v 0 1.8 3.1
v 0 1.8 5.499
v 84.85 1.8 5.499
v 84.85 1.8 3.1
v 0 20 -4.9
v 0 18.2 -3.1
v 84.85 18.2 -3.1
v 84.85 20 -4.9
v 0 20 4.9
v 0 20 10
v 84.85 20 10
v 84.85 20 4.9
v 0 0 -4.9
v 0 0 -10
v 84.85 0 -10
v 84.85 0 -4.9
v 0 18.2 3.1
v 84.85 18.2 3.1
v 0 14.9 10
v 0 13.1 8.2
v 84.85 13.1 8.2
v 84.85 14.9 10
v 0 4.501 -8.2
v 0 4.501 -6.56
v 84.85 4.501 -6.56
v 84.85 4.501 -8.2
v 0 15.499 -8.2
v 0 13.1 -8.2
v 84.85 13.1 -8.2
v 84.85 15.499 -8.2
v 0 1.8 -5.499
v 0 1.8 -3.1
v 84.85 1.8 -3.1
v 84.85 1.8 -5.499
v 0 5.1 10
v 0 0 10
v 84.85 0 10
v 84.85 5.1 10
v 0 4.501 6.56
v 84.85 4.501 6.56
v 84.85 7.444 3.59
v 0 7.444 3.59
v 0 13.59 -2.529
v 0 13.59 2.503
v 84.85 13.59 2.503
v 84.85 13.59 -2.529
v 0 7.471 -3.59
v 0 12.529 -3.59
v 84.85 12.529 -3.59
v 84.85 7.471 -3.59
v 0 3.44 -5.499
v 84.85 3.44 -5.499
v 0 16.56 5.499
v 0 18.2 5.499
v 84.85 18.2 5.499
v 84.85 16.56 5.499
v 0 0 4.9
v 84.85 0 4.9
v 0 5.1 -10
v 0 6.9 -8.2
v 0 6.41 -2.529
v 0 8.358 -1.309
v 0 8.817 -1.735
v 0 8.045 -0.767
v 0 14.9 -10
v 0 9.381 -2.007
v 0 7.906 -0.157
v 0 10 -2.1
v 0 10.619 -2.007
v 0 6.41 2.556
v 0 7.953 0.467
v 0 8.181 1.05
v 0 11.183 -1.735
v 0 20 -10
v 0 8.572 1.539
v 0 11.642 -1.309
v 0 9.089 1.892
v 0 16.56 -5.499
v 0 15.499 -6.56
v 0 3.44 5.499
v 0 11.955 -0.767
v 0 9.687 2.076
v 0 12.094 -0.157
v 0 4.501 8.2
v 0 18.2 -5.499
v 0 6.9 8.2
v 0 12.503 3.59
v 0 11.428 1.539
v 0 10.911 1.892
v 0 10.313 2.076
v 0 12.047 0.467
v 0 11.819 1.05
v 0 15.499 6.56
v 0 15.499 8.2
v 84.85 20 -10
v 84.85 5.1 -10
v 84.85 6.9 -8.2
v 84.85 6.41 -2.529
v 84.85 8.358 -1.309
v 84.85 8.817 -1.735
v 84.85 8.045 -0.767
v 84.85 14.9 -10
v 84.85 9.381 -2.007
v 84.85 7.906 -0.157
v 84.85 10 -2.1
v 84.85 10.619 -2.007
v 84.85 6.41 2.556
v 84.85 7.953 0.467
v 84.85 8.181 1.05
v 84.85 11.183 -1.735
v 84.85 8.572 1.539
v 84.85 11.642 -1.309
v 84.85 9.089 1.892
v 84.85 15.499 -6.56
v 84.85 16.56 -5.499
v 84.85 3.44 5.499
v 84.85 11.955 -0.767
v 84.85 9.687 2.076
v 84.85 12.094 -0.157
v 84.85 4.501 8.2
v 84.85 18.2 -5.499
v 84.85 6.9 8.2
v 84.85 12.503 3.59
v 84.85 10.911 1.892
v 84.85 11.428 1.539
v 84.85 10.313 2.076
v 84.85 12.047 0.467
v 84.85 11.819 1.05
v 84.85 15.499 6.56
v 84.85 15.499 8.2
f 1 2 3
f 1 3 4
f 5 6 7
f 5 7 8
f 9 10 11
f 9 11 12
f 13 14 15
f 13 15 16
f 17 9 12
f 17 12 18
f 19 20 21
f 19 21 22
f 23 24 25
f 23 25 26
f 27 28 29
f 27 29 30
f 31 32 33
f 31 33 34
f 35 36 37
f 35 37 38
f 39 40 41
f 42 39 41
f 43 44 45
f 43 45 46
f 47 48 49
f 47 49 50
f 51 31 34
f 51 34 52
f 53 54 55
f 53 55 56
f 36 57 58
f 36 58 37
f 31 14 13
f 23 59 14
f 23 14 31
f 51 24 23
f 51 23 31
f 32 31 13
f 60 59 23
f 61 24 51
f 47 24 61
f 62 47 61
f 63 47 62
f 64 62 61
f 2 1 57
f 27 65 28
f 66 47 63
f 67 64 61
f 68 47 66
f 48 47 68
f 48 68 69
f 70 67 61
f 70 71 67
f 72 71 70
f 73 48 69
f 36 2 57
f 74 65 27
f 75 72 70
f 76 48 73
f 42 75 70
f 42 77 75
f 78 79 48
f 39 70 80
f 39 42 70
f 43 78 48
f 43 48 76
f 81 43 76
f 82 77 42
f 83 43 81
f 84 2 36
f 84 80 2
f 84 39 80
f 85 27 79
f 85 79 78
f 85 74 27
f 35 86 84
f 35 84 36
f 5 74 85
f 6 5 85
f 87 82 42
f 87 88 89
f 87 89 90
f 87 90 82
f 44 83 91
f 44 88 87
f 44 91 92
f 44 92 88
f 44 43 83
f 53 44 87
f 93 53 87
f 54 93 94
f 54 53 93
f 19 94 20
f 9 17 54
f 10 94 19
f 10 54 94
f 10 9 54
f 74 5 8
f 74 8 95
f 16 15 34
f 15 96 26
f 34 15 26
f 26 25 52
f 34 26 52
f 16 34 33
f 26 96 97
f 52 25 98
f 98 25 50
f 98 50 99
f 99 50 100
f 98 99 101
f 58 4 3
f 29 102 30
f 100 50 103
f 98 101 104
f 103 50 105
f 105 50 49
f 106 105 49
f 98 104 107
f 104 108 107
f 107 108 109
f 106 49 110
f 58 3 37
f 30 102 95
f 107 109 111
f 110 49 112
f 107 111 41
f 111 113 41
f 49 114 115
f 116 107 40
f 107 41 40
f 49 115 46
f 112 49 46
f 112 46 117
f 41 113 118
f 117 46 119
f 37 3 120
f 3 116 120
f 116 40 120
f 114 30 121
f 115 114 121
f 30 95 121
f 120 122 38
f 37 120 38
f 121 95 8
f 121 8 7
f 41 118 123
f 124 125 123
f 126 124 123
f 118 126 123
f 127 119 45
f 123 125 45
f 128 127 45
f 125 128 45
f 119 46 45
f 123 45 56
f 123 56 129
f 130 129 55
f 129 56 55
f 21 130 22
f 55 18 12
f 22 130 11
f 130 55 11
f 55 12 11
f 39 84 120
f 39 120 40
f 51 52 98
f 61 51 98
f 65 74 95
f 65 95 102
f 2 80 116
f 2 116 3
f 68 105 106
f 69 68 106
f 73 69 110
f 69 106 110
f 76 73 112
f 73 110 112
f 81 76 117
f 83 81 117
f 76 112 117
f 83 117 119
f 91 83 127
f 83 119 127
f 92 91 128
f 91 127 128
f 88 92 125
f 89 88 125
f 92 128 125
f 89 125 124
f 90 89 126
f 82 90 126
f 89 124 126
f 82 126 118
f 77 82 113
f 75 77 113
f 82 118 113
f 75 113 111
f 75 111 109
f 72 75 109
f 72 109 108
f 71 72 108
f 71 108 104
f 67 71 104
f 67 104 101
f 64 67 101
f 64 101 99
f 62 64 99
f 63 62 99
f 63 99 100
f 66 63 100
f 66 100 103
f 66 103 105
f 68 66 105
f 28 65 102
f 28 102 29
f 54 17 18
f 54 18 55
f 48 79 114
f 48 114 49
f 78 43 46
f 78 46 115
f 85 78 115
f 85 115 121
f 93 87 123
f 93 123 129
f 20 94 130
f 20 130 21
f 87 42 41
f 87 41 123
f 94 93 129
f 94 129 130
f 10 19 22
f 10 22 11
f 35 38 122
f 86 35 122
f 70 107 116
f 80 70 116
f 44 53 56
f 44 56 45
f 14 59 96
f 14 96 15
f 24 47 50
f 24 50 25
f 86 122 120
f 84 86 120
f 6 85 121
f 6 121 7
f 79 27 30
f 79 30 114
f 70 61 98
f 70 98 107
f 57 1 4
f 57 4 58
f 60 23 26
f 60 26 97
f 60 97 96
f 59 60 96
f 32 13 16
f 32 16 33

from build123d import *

# Parameters (mm, degrees)
BOSS_EXTRUDE1_DEPTH = 84.85
SKETCH2_R           = 2.1
CUT_EXTRUDE1_DEPTH  = 88.746923023


with BuildPart() as part:
    # Sketch1 → Boss-Extrude1 (new body)
    with BuildSketch(Plane(origin=(0, 0, 0), x_dir=(0, 0, -1), z_dir=(1, 0, 0))):
        Polygon((-10, 20), (-4.900000095, 20), (-3.099999905, 18.200000763), (-5.499340057, 18.200000763), (-5.499340057, 16.559999466), (-2.502582312, 13.590000153), (2.52933979, 13.590000153), (5.499340057, 16.559999466), (5.499340057, 18.200000763), (3.099999905, 18.200000763), (4.900000095, 20), (10, 20), (10, 14.899999619), (8.199999809, 13.100000381), (8.199999809, 15.499340057), (6.559999943, 15.499340057), (3.589999914, 12.52933979), (3.589999914, 7.47066021), (6.559999943, 4.500659943), (8.199999809, 4.500659943), (8.199999809, 6.900000095), (10, 5.099999905), (10, 0), (4.900000095, 0), (3.099999905, 1.799999952), (5.499340057, 1.799999952), (5.499340057, 3.440000057), (2.52933979, 6.409999847), (-2.555858612, 6.409999847), (-5.499340057, 3.440000057), (-5.499340057, 1.799999952), (-3.099999905, 1.799999952), (-4.900000095, 0), (-10, 0), (-10, 5.099999905), (-8.199999809, 6.899999951), (-8.199999809, 4.500659943), (-6.559999943, 4.500659943), (-3.589999914, 7.444141388), (-3.589999914, 12.50258255), (-6.559999943, 15.499340057), (-8.199999809, 15.499340057), (-8.199999809, 13.100000381), (-10, 14.899999619), align=None)
    extrude(amount=BOSS_EXTRUDE1_DEPTH)

    # Sketch2 → Cut-Extrude1 (cut, through all)
    with BuildSketch(Plane(origin=(84.85, 0, 0), x_dir=(0, 0, -1), z_dir=(1, 0, 0))):
        with Locations((5.9664e-05, 10)):
            Circle(SKETCH2_R)
    extrude(amount=-CUT_EXTRUDE1_DEPTH, mode=Mode.SUBTRACT)


solid = part.part
